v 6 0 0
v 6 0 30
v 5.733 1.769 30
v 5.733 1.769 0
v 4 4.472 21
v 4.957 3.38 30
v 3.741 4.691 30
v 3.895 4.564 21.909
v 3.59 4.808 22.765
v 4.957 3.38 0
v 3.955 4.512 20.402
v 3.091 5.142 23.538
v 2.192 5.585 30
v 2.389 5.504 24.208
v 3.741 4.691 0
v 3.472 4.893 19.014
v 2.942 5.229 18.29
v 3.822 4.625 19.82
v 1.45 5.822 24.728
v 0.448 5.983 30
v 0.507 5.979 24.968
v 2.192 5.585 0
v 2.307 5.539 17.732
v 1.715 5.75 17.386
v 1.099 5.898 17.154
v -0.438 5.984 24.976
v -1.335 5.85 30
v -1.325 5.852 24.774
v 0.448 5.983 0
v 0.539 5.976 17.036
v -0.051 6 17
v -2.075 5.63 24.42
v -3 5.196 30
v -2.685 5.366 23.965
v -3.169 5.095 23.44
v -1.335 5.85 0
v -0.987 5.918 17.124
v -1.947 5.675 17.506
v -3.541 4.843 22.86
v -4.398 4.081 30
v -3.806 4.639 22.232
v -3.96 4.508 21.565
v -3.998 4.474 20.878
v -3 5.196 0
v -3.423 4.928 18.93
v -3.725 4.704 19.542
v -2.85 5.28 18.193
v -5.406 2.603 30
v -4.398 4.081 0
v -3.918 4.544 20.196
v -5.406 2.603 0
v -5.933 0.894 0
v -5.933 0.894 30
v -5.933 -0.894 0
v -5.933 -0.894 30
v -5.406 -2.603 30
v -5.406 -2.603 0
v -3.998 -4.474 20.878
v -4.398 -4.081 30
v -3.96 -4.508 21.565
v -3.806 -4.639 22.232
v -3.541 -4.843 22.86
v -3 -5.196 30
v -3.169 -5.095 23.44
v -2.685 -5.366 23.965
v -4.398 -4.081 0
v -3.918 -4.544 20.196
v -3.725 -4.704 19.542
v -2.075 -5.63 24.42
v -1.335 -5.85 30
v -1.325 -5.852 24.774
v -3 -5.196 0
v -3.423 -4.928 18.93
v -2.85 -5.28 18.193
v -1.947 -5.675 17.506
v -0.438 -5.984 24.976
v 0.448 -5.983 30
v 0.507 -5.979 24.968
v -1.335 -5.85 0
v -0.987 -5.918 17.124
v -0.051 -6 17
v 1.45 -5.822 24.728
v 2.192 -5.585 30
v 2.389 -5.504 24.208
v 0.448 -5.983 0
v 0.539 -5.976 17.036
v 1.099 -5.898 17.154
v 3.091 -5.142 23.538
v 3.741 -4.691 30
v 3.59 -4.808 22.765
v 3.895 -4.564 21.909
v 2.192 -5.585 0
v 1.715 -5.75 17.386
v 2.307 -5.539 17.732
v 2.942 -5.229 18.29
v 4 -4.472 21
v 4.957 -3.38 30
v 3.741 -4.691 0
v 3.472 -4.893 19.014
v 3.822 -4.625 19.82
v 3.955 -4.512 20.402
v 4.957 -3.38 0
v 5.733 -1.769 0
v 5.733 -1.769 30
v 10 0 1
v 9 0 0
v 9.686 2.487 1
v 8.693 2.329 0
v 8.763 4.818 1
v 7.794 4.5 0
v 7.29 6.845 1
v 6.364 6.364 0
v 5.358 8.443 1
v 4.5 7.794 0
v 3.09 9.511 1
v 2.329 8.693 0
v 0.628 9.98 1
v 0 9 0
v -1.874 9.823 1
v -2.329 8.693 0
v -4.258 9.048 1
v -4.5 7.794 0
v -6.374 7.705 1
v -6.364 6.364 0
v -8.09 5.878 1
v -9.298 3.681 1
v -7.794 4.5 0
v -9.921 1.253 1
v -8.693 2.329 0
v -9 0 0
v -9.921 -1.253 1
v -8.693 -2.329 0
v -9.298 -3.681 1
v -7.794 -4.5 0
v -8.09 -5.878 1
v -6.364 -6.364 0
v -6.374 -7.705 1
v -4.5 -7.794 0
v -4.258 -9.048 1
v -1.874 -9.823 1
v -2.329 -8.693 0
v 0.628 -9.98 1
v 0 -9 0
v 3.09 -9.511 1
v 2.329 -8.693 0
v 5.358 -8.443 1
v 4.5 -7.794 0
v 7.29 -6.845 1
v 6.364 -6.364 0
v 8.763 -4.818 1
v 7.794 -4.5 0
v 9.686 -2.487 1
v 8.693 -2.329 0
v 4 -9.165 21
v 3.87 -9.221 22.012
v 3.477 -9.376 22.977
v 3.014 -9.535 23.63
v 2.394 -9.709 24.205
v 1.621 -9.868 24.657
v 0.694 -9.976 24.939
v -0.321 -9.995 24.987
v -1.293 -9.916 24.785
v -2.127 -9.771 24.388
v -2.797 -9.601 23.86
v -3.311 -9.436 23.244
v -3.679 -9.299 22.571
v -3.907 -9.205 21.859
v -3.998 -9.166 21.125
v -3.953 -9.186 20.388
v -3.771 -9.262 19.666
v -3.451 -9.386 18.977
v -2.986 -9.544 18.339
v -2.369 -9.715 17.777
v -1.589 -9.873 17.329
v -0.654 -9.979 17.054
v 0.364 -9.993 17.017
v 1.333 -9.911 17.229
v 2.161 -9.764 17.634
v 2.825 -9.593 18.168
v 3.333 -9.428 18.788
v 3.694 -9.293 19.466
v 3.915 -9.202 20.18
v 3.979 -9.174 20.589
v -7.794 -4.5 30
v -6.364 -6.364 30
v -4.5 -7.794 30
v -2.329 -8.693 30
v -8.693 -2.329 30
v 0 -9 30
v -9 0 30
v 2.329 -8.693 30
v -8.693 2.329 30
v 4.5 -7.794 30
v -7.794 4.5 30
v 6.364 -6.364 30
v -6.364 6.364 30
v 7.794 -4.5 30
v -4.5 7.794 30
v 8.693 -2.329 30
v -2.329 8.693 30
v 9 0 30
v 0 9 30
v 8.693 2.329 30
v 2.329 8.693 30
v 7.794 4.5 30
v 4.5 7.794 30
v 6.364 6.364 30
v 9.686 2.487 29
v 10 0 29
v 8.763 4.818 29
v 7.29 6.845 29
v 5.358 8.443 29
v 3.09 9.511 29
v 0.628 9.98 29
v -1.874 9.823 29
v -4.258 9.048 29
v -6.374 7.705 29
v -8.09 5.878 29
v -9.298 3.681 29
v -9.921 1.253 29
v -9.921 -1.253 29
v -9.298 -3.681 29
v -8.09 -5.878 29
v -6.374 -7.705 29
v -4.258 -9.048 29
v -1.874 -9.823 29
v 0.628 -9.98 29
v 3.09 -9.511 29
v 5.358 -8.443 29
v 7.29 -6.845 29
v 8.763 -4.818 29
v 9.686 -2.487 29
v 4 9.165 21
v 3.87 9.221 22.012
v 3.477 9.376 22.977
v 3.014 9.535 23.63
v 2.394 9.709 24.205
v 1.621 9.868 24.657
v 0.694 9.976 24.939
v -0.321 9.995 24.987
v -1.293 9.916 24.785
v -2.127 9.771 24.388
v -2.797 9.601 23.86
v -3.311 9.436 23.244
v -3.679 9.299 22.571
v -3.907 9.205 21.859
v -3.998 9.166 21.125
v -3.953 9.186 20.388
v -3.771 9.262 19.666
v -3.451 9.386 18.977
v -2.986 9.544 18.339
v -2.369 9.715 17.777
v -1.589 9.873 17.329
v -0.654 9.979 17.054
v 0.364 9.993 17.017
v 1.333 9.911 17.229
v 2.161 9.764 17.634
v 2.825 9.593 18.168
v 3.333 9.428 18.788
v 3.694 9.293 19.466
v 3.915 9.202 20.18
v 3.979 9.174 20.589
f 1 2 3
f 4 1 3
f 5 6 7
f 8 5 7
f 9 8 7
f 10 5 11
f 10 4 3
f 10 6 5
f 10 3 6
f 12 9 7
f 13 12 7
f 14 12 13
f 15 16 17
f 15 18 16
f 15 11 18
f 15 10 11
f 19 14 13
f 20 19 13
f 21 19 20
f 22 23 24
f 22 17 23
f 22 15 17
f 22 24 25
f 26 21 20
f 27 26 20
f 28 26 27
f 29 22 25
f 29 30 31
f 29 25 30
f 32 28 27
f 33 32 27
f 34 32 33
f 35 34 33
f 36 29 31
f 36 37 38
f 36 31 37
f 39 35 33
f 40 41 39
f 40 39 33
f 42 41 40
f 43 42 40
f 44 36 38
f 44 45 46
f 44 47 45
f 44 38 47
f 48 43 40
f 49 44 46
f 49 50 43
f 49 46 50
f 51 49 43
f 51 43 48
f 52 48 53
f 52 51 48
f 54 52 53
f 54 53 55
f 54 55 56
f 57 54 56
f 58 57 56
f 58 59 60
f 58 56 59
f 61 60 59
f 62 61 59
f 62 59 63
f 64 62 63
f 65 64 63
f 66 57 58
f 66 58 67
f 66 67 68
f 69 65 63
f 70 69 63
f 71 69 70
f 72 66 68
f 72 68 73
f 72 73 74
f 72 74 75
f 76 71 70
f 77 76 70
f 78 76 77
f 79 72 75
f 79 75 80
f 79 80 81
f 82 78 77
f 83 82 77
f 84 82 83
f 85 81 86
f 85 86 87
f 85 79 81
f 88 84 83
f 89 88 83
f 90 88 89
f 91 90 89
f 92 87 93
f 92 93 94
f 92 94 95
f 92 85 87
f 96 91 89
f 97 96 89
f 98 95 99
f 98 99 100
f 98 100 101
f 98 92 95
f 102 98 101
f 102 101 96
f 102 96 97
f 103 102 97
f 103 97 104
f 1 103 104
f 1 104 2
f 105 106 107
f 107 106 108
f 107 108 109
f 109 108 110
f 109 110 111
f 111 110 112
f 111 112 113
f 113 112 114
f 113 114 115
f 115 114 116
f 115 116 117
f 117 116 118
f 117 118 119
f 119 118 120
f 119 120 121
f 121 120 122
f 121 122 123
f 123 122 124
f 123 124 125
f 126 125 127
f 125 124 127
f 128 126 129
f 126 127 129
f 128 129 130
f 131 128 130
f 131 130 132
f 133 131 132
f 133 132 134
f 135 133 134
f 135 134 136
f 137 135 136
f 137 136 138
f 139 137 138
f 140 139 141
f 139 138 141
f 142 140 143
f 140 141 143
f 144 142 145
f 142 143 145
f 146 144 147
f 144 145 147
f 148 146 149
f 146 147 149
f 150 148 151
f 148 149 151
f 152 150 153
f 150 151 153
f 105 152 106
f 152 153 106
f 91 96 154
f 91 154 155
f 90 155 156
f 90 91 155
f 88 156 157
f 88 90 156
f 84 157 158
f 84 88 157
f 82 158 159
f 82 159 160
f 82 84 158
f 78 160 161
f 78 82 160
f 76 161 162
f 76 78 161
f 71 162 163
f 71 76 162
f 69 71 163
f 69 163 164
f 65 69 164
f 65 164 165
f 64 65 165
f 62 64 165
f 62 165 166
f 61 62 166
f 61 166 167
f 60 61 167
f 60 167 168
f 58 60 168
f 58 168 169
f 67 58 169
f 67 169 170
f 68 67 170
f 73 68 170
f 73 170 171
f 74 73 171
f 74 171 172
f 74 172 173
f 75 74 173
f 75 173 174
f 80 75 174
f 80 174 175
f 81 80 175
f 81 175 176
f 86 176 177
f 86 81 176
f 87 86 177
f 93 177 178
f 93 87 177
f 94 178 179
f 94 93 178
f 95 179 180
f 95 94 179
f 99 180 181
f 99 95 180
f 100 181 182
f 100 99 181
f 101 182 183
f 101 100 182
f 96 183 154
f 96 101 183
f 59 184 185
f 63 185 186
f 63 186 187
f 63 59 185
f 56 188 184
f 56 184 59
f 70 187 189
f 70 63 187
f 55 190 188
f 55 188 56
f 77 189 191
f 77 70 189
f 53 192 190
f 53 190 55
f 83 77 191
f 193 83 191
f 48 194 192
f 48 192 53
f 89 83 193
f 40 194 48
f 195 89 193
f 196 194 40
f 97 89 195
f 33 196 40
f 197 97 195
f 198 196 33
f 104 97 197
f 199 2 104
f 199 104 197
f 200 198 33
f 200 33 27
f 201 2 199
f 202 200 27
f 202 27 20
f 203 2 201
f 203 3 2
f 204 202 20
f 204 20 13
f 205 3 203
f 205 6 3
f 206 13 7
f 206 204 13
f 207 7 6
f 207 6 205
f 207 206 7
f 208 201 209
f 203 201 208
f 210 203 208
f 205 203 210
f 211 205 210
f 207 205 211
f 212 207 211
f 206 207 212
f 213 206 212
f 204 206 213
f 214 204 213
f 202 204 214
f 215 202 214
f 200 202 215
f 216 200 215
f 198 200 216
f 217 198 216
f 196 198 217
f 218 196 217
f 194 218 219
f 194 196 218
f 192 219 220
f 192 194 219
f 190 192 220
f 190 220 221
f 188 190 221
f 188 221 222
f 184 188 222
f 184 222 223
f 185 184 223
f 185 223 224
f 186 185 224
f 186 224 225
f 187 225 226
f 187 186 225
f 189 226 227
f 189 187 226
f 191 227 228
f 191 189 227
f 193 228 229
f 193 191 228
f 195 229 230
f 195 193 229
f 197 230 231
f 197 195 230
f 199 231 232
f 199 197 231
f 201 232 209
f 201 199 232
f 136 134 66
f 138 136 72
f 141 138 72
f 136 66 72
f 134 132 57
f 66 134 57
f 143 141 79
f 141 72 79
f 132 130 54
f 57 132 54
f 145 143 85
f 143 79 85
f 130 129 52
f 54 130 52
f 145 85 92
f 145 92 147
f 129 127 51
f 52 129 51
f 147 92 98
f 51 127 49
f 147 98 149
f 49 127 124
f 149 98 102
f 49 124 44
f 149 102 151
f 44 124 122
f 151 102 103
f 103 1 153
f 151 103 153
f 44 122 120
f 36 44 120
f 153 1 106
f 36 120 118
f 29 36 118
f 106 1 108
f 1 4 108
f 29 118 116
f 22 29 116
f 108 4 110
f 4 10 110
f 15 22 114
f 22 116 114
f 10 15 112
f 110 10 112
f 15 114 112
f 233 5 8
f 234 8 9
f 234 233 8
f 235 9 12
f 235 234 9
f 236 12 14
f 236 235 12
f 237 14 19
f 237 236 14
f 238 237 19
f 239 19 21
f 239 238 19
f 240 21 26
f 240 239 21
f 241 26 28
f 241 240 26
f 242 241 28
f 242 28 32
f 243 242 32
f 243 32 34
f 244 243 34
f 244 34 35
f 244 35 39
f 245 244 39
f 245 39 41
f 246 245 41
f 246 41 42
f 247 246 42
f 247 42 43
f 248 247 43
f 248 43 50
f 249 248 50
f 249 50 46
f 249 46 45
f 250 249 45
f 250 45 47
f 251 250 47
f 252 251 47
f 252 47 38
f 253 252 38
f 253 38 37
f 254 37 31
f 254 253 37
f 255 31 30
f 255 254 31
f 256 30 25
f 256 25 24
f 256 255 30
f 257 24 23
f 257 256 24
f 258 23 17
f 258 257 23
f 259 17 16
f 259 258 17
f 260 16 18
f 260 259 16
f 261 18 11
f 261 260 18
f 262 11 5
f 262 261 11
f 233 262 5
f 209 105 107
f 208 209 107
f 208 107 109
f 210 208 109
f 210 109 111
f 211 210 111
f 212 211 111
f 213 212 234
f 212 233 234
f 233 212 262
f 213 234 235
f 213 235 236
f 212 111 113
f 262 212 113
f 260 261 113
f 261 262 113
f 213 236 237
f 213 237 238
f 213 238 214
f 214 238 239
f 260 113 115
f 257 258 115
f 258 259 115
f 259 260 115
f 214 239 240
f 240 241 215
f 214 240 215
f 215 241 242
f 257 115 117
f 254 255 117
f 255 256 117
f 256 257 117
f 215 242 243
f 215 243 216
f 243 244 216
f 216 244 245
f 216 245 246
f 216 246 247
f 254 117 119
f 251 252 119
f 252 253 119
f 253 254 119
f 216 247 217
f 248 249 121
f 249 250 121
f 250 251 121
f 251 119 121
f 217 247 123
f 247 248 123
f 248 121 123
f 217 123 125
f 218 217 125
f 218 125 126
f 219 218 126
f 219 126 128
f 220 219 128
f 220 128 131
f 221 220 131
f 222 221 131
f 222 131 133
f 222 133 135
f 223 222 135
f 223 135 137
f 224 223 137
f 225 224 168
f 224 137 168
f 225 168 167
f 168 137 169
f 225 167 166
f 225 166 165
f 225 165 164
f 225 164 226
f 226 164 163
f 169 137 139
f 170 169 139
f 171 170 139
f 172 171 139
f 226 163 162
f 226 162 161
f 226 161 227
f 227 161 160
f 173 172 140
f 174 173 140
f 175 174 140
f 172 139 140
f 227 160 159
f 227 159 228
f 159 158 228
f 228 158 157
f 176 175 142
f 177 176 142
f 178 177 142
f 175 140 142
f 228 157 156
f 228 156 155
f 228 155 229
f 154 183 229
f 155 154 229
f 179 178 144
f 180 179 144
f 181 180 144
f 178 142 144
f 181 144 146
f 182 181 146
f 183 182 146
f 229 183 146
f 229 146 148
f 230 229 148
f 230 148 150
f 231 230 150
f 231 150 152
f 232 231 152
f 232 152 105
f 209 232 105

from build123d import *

# Parameters (mm, degrees)
CYLINDER002_R     = 4
CYLINDER002_DEPTH = 30
CYLINDER001_R     = 6
CYLINDER001_DEPTH = 30
CYLINDER_R        = 10
CYLINDER_DEPTH    = 30
CHAMFER_SIZE      = 1
CHAMFER001_SIZE   = 1


with BuildPart() as cilindro002:
    # Cylinder002 → Cylinder002 (new body)
    with BuildSketch(Plane(origin=(0, 15, 21), x_dir=(1, 0, 0), z_dir=(0, -1, 0))):
        Circle(CYLINDER002_R)
    extrude(amount=CYLINDER002_DEPTH)


with BuildPart() as cilindro001:
    # Cylinder001 → Cylinder001 (new body)
    with BuildSketch(Plane.XY):
        Circle(CYLINDER001_R)
    extrude(amount=CYLINDER001_DEPTH)


with BuildPart() as chamfer001:
    # Cylinder → Cylinder (new body)
    with BuildSketch(Plane.XY):
        Circle(CYLINDER_R)
    extrude(amount=CYLINDER_DEPTH)

    # Cut: cut Cilindro001
    add(cilindro001.part, mode=Mode.SUBTRACT)

    # Cut001: cut Cilindro002
    add(cilindro002.part, mode=Mode.SUBTRACT)

    # Chamfer
    chamfer_edges = [chamfer001.edges().sort_by_distance(p)[0] for p in [
        (-10, 0, 30),
    ]]
    chamfer(chamfer_edges, length=CHAMFER_SIZE)

    # Chamfer001
    chamfer001_edges = [chamfer001.edges().sort_by_distance(p)[0] for p in [
        (-10, 0, 0),
    ]]
    chamfer(chamfer001_edges, length=CHAMFER001_SIZE)


solid = chamfer001.part
